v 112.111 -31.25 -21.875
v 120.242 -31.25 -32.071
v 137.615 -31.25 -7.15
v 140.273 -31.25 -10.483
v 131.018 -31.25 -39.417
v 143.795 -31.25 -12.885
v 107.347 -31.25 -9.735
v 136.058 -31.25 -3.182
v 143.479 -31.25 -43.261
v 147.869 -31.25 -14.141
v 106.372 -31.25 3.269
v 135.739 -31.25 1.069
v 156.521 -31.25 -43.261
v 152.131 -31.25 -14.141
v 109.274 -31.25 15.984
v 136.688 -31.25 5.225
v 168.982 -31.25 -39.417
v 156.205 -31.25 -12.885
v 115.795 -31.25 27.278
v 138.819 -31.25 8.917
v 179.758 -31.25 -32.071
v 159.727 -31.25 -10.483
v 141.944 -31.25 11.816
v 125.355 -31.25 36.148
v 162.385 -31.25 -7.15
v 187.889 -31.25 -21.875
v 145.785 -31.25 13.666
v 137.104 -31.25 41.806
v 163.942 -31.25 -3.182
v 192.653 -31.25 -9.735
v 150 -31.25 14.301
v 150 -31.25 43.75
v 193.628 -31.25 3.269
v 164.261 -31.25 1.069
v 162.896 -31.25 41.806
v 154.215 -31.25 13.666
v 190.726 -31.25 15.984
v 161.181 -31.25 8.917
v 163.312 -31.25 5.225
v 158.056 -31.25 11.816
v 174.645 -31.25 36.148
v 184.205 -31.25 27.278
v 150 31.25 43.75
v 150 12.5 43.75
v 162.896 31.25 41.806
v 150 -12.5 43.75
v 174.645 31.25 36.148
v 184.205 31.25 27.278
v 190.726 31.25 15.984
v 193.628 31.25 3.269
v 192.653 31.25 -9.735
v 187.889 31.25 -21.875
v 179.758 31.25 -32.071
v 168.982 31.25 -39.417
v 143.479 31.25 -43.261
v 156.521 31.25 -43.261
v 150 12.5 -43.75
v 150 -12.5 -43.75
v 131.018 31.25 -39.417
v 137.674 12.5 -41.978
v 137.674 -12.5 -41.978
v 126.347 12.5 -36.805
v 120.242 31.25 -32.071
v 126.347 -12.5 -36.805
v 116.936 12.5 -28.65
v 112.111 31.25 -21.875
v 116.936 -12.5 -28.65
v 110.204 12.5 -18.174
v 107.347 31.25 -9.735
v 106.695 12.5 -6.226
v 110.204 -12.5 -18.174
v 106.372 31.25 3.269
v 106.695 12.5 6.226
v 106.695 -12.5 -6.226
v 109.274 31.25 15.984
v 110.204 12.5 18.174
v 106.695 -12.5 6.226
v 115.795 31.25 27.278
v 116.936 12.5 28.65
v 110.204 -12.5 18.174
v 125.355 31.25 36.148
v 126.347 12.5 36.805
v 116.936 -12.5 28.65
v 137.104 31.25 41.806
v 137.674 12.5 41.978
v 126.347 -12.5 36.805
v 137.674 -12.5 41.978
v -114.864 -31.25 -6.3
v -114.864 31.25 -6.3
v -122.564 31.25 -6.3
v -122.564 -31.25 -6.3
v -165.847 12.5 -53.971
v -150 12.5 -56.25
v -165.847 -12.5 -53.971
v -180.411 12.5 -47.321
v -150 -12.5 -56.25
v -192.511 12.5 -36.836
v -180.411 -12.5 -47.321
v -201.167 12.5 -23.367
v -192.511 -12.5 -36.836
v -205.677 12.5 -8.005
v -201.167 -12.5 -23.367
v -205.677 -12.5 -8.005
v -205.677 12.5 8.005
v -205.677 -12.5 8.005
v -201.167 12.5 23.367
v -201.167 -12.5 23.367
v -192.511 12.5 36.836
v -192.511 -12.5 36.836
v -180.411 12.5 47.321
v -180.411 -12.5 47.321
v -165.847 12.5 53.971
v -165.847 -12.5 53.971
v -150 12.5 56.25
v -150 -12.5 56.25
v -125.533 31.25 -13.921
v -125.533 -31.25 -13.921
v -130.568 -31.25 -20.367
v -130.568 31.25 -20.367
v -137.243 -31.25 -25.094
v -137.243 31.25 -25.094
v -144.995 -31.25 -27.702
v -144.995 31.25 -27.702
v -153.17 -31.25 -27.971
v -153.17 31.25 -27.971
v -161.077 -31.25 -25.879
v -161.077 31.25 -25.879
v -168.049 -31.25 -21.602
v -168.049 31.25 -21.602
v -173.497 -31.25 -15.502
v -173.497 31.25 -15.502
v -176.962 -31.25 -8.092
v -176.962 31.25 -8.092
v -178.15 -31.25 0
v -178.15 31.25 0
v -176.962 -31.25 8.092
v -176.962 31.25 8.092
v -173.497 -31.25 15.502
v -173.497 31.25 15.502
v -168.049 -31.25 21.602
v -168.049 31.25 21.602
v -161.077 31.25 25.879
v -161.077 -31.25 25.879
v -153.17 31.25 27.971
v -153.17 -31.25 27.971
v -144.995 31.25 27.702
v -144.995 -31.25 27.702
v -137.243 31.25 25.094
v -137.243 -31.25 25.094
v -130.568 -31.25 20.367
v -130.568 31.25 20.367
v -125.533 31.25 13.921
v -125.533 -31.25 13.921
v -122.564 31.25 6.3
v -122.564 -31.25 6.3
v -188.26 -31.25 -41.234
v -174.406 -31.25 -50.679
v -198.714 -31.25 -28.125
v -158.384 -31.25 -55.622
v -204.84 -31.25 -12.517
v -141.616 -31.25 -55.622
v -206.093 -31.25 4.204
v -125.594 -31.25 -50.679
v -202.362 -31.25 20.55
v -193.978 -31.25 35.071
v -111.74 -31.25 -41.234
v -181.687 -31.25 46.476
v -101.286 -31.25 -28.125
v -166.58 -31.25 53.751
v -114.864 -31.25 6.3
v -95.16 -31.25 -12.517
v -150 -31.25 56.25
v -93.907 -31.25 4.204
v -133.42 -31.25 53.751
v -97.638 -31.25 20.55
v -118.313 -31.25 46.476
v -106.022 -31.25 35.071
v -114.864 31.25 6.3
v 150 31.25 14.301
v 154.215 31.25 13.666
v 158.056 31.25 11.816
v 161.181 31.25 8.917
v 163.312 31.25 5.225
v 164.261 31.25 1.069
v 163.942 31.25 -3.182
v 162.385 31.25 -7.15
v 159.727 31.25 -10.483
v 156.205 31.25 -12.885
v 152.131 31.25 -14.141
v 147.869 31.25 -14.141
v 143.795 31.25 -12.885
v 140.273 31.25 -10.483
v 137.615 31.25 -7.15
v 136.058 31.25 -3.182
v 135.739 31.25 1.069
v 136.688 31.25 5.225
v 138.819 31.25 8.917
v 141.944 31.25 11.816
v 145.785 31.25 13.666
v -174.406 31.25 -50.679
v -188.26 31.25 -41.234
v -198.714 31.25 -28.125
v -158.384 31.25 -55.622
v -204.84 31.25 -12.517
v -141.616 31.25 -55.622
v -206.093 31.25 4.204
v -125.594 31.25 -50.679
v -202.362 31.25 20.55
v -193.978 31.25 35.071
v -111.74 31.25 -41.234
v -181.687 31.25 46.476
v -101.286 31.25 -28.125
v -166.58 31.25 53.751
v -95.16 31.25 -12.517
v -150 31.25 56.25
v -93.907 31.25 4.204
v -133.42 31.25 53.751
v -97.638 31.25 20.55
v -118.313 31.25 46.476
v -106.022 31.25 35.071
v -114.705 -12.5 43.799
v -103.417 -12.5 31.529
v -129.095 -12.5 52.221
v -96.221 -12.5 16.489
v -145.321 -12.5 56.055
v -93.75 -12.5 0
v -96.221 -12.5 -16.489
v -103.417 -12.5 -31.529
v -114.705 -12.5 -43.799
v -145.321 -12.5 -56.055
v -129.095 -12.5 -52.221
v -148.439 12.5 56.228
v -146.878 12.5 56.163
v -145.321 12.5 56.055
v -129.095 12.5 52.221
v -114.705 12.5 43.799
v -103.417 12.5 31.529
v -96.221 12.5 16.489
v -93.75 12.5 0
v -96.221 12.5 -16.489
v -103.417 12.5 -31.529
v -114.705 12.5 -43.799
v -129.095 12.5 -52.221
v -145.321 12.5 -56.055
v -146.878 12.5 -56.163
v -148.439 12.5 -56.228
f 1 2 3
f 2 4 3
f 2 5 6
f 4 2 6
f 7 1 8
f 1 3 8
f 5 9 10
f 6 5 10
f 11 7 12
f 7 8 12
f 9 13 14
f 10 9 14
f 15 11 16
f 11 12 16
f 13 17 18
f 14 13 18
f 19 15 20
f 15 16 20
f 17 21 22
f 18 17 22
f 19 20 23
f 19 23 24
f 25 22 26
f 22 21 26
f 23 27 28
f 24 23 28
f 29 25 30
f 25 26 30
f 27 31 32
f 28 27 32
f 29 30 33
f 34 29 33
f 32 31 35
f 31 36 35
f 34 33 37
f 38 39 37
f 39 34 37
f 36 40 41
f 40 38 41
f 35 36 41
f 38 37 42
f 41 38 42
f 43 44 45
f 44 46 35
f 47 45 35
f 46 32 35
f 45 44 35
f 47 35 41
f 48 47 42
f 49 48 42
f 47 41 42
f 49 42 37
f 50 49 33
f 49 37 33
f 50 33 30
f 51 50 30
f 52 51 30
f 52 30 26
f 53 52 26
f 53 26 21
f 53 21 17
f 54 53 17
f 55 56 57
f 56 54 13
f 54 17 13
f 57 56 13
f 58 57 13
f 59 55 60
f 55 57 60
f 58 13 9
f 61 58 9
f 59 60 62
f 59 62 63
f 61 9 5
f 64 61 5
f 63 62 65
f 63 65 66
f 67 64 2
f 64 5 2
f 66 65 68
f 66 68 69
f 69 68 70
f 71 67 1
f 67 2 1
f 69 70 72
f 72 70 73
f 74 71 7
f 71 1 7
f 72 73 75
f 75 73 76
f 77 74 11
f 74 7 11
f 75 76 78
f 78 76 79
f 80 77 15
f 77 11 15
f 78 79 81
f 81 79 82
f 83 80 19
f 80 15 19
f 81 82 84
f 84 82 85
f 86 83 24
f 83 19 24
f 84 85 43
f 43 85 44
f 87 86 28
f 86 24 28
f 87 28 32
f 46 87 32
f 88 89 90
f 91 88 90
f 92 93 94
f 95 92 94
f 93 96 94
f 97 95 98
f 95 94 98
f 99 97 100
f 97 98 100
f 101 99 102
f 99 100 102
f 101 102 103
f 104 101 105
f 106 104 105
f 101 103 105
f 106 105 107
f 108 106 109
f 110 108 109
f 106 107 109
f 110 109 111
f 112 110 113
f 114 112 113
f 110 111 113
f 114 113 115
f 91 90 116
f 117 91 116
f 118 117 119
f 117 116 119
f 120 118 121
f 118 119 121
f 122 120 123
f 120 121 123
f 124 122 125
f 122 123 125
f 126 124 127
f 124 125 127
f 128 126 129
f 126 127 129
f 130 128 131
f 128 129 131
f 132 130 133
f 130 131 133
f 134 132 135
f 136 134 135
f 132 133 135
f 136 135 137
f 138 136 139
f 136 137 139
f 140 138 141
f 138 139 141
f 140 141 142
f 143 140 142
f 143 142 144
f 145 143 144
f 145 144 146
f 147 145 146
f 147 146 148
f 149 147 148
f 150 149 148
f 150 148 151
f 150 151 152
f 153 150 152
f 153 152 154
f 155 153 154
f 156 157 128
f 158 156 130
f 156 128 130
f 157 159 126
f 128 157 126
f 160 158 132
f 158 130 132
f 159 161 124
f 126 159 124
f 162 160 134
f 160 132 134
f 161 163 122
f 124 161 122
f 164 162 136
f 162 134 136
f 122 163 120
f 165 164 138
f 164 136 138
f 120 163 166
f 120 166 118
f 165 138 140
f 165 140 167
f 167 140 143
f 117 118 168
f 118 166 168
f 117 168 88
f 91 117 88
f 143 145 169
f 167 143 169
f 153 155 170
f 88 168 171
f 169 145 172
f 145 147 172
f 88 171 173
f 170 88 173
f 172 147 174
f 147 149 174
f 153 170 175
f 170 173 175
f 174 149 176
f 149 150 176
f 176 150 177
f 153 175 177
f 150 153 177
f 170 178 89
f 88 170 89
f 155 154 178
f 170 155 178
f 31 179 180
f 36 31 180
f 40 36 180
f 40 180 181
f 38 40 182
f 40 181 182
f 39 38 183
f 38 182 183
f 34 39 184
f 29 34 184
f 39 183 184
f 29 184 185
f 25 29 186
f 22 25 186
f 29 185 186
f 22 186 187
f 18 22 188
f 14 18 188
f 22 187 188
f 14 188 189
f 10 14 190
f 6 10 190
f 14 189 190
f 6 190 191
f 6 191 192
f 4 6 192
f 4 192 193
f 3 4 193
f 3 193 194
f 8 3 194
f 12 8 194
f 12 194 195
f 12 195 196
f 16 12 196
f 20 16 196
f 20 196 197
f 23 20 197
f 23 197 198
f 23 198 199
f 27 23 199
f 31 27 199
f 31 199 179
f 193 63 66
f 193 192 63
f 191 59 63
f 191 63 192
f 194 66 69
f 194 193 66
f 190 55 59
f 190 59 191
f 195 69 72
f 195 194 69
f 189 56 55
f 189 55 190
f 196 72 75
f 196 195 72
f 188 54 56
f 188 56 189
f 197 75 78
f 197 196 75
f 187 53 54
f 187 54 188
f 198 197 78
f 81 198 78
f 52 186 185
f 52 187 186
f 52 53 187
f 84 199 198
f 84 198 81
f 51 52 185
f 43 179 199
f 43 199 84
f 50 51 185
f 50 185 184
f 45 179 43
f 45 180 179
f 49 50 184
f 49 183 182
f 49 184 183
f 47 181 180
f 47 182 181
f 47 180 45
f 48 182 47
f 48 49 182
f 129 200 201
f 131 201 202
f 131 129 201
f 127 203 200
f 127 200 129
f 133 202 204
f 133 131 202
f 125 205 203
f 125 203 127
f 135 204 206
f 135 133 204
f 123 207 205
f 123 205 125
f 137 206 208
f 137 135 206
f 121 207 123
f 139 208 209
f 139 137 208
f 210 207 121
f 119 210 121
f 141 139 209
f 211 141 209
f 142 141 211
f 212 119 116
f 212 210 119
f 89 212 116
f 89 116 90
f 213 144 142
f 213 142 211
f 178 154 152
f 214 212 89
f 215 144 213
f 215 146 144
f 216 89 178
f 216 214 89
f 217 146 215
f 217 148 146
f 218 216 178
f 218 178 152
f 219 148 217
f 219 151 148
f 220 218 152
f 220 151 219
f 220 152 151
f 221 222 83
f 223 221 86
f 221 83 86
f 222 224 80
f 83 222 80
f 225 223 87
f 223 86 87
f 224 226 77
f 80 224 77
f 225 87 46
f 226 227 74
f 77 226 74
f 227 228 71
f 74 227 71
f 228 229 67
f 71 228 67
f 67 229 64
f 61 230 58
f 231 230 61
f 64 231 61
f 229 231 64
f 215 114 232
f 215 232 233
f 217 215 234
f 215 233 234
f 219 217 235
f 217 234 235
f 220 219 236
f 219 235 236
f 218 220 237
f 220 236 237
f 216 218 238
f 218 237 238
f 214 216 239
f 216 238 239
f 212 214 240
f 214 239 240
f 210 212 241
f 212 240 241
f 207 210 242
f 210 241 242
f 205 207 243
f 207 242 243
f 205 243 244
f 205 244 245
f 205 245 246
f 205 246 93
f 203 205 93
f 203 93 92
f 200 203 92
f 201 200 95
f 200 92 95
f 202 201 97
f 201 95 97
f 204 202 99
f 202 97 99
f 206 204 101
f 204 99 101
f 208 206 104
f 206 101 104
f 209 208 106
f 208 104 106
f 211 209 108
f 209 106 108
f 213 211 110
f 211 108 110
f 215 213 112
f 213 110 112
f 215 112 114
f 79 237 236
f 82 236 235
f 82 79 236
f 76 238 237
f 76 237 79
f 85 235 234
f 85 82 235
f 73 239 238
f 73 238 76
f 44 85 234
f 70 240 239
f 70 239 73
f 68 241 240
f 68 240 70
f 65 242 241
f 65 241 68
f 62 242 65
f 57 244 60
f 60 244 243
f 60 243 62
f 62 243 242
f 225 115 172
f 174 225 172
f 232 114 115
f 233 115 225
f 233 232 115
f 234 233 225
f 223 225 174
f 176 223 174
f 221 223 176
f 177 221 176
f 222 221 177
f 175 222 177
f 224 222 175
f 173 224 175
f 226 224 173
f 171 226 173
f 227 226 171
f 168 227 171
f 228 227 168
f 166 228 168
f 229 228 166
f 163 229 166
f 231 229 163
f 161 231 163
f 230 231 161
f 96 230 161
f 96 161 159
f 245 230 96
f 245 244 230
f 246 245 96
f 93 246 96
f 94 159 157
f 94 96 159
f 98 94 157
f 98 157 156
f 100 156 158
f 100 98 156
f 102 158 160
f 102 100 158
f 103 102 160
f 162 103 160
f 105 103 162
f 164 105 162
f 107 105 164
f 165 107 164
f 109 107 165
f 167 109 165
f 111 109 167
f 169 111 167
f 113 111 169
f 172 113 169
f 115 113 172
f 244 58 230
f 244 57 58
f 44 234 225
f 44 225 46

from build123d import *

# Parameters (mm, degrees)
SKETCH1_R                = 21.9
BOSS_EXTRUDE3_DEPTH      = 12.5
SKETCH2_R                = 43.75
SKETCH2_R_2              = 56.25
BOSS_EXTRUDE4_DEPTH      = 18.75
BOSS_EXTRUDE4_DEPTH_BACK = 43.75
SKETCH3_R                = 14.300981298
CUT_EXTRUDE1_DEPTH       = 223.731621015


with BuildPart() as part:
    # Sketch1 → Boss-Extrude3 (new, symmetric)
    with BuildSketch(Plane(origin=(0, 0, 0), x_dir=(1, 0, 0), z_dir=(0, 1, 0))):
        with BuildLine():
            Line((-145.320623917, 56.055025997), (-150, 56.25))
            ThreePointArc((-150, 56.25), (-206.25, 0), (-150, -56.25))
            Line((-150, -56.25), (-145.320623917, -56.055025997))
            Line((-145.320623917, -56.055025997), (150, -43.75))
            ThreePointArc((150, -43.75), (193.75, 0), (150, 43.75))
            Line((150, 43.75), (-145.320623917, 56.055025997))
        make_face()
        with BuildLine():
            Line((-122.564029086, 6.3), (-114.864029086, 6.3))
            Line((-114.864029086, 6.3), (-114.864029086, -6.3))
            Line((-114.864029086, -6.3), (-122.564029086, -6.3))
            ThreePointArc((-122.564029086, -6.3), (-178.15, 0), (-122.564029086, 6.3))
        make_face(mode=Mode.SUBTRACT)
        with Locations(Location((150, 0, 0), (0, 0, 270))):
            Circle(SKETCH1_R, mode=Mode.SUBTRACT)
    extrude(amount=BOSS_EXTRUDE3_DEPTH, both=True)

    # Sketch2 → Boss-Extrude4 (add, two sides)
    with BuildSketch(Plane(origin=(0, 12.5, 0), x_dir=(1, 0, 0), z_dir=(0, 1, 0))) as boss_extrude4_sk:
        with Locations(Location((150, 0, 0), (0, 0, 270))):
            Circle(SKETCH2_R)
        with Locations(Location((-150, 0, 0), (0, 0, 270))):
            Circle(SKETCH2_R_2)
    extrude(amount=BOSS_EXTRUDE4_DEPTH)
    extrude(boss_extrude4_sk.sketch, amount=-BOSS_EXTRUDE4_DEPTH_BACK)

    # Sketch3 → Cut-Extrude1 (cut, through all)
    with BuildSketch(Plane(origin=(0, 31.25, 0), x_dir=(1, 0, 0), z_dir=(0, 1, 0))):
        with Locations(Location((150, 0, 0), (0, 0, 270))):
            Circle(SKETCH3_R)
        with BuildLine():
            Line((-114.864029086, -6.3), (-114.864029086, 6.3))
            Line((-114.864029086, 6.3), (-122.564029086, 6.3))
            ThreePointArc((-122.564029086, 6.3), (-178.15, 0), (-122.564029086, -6.3))
            Line((-122.564029086, -6.3), (-114.864029086, -6.3))
        make_face()
    extrude(amount=-CUT_EXTRUDE1_DEPTH, mode=Mode.SUBTRACT)


solid = part.part
